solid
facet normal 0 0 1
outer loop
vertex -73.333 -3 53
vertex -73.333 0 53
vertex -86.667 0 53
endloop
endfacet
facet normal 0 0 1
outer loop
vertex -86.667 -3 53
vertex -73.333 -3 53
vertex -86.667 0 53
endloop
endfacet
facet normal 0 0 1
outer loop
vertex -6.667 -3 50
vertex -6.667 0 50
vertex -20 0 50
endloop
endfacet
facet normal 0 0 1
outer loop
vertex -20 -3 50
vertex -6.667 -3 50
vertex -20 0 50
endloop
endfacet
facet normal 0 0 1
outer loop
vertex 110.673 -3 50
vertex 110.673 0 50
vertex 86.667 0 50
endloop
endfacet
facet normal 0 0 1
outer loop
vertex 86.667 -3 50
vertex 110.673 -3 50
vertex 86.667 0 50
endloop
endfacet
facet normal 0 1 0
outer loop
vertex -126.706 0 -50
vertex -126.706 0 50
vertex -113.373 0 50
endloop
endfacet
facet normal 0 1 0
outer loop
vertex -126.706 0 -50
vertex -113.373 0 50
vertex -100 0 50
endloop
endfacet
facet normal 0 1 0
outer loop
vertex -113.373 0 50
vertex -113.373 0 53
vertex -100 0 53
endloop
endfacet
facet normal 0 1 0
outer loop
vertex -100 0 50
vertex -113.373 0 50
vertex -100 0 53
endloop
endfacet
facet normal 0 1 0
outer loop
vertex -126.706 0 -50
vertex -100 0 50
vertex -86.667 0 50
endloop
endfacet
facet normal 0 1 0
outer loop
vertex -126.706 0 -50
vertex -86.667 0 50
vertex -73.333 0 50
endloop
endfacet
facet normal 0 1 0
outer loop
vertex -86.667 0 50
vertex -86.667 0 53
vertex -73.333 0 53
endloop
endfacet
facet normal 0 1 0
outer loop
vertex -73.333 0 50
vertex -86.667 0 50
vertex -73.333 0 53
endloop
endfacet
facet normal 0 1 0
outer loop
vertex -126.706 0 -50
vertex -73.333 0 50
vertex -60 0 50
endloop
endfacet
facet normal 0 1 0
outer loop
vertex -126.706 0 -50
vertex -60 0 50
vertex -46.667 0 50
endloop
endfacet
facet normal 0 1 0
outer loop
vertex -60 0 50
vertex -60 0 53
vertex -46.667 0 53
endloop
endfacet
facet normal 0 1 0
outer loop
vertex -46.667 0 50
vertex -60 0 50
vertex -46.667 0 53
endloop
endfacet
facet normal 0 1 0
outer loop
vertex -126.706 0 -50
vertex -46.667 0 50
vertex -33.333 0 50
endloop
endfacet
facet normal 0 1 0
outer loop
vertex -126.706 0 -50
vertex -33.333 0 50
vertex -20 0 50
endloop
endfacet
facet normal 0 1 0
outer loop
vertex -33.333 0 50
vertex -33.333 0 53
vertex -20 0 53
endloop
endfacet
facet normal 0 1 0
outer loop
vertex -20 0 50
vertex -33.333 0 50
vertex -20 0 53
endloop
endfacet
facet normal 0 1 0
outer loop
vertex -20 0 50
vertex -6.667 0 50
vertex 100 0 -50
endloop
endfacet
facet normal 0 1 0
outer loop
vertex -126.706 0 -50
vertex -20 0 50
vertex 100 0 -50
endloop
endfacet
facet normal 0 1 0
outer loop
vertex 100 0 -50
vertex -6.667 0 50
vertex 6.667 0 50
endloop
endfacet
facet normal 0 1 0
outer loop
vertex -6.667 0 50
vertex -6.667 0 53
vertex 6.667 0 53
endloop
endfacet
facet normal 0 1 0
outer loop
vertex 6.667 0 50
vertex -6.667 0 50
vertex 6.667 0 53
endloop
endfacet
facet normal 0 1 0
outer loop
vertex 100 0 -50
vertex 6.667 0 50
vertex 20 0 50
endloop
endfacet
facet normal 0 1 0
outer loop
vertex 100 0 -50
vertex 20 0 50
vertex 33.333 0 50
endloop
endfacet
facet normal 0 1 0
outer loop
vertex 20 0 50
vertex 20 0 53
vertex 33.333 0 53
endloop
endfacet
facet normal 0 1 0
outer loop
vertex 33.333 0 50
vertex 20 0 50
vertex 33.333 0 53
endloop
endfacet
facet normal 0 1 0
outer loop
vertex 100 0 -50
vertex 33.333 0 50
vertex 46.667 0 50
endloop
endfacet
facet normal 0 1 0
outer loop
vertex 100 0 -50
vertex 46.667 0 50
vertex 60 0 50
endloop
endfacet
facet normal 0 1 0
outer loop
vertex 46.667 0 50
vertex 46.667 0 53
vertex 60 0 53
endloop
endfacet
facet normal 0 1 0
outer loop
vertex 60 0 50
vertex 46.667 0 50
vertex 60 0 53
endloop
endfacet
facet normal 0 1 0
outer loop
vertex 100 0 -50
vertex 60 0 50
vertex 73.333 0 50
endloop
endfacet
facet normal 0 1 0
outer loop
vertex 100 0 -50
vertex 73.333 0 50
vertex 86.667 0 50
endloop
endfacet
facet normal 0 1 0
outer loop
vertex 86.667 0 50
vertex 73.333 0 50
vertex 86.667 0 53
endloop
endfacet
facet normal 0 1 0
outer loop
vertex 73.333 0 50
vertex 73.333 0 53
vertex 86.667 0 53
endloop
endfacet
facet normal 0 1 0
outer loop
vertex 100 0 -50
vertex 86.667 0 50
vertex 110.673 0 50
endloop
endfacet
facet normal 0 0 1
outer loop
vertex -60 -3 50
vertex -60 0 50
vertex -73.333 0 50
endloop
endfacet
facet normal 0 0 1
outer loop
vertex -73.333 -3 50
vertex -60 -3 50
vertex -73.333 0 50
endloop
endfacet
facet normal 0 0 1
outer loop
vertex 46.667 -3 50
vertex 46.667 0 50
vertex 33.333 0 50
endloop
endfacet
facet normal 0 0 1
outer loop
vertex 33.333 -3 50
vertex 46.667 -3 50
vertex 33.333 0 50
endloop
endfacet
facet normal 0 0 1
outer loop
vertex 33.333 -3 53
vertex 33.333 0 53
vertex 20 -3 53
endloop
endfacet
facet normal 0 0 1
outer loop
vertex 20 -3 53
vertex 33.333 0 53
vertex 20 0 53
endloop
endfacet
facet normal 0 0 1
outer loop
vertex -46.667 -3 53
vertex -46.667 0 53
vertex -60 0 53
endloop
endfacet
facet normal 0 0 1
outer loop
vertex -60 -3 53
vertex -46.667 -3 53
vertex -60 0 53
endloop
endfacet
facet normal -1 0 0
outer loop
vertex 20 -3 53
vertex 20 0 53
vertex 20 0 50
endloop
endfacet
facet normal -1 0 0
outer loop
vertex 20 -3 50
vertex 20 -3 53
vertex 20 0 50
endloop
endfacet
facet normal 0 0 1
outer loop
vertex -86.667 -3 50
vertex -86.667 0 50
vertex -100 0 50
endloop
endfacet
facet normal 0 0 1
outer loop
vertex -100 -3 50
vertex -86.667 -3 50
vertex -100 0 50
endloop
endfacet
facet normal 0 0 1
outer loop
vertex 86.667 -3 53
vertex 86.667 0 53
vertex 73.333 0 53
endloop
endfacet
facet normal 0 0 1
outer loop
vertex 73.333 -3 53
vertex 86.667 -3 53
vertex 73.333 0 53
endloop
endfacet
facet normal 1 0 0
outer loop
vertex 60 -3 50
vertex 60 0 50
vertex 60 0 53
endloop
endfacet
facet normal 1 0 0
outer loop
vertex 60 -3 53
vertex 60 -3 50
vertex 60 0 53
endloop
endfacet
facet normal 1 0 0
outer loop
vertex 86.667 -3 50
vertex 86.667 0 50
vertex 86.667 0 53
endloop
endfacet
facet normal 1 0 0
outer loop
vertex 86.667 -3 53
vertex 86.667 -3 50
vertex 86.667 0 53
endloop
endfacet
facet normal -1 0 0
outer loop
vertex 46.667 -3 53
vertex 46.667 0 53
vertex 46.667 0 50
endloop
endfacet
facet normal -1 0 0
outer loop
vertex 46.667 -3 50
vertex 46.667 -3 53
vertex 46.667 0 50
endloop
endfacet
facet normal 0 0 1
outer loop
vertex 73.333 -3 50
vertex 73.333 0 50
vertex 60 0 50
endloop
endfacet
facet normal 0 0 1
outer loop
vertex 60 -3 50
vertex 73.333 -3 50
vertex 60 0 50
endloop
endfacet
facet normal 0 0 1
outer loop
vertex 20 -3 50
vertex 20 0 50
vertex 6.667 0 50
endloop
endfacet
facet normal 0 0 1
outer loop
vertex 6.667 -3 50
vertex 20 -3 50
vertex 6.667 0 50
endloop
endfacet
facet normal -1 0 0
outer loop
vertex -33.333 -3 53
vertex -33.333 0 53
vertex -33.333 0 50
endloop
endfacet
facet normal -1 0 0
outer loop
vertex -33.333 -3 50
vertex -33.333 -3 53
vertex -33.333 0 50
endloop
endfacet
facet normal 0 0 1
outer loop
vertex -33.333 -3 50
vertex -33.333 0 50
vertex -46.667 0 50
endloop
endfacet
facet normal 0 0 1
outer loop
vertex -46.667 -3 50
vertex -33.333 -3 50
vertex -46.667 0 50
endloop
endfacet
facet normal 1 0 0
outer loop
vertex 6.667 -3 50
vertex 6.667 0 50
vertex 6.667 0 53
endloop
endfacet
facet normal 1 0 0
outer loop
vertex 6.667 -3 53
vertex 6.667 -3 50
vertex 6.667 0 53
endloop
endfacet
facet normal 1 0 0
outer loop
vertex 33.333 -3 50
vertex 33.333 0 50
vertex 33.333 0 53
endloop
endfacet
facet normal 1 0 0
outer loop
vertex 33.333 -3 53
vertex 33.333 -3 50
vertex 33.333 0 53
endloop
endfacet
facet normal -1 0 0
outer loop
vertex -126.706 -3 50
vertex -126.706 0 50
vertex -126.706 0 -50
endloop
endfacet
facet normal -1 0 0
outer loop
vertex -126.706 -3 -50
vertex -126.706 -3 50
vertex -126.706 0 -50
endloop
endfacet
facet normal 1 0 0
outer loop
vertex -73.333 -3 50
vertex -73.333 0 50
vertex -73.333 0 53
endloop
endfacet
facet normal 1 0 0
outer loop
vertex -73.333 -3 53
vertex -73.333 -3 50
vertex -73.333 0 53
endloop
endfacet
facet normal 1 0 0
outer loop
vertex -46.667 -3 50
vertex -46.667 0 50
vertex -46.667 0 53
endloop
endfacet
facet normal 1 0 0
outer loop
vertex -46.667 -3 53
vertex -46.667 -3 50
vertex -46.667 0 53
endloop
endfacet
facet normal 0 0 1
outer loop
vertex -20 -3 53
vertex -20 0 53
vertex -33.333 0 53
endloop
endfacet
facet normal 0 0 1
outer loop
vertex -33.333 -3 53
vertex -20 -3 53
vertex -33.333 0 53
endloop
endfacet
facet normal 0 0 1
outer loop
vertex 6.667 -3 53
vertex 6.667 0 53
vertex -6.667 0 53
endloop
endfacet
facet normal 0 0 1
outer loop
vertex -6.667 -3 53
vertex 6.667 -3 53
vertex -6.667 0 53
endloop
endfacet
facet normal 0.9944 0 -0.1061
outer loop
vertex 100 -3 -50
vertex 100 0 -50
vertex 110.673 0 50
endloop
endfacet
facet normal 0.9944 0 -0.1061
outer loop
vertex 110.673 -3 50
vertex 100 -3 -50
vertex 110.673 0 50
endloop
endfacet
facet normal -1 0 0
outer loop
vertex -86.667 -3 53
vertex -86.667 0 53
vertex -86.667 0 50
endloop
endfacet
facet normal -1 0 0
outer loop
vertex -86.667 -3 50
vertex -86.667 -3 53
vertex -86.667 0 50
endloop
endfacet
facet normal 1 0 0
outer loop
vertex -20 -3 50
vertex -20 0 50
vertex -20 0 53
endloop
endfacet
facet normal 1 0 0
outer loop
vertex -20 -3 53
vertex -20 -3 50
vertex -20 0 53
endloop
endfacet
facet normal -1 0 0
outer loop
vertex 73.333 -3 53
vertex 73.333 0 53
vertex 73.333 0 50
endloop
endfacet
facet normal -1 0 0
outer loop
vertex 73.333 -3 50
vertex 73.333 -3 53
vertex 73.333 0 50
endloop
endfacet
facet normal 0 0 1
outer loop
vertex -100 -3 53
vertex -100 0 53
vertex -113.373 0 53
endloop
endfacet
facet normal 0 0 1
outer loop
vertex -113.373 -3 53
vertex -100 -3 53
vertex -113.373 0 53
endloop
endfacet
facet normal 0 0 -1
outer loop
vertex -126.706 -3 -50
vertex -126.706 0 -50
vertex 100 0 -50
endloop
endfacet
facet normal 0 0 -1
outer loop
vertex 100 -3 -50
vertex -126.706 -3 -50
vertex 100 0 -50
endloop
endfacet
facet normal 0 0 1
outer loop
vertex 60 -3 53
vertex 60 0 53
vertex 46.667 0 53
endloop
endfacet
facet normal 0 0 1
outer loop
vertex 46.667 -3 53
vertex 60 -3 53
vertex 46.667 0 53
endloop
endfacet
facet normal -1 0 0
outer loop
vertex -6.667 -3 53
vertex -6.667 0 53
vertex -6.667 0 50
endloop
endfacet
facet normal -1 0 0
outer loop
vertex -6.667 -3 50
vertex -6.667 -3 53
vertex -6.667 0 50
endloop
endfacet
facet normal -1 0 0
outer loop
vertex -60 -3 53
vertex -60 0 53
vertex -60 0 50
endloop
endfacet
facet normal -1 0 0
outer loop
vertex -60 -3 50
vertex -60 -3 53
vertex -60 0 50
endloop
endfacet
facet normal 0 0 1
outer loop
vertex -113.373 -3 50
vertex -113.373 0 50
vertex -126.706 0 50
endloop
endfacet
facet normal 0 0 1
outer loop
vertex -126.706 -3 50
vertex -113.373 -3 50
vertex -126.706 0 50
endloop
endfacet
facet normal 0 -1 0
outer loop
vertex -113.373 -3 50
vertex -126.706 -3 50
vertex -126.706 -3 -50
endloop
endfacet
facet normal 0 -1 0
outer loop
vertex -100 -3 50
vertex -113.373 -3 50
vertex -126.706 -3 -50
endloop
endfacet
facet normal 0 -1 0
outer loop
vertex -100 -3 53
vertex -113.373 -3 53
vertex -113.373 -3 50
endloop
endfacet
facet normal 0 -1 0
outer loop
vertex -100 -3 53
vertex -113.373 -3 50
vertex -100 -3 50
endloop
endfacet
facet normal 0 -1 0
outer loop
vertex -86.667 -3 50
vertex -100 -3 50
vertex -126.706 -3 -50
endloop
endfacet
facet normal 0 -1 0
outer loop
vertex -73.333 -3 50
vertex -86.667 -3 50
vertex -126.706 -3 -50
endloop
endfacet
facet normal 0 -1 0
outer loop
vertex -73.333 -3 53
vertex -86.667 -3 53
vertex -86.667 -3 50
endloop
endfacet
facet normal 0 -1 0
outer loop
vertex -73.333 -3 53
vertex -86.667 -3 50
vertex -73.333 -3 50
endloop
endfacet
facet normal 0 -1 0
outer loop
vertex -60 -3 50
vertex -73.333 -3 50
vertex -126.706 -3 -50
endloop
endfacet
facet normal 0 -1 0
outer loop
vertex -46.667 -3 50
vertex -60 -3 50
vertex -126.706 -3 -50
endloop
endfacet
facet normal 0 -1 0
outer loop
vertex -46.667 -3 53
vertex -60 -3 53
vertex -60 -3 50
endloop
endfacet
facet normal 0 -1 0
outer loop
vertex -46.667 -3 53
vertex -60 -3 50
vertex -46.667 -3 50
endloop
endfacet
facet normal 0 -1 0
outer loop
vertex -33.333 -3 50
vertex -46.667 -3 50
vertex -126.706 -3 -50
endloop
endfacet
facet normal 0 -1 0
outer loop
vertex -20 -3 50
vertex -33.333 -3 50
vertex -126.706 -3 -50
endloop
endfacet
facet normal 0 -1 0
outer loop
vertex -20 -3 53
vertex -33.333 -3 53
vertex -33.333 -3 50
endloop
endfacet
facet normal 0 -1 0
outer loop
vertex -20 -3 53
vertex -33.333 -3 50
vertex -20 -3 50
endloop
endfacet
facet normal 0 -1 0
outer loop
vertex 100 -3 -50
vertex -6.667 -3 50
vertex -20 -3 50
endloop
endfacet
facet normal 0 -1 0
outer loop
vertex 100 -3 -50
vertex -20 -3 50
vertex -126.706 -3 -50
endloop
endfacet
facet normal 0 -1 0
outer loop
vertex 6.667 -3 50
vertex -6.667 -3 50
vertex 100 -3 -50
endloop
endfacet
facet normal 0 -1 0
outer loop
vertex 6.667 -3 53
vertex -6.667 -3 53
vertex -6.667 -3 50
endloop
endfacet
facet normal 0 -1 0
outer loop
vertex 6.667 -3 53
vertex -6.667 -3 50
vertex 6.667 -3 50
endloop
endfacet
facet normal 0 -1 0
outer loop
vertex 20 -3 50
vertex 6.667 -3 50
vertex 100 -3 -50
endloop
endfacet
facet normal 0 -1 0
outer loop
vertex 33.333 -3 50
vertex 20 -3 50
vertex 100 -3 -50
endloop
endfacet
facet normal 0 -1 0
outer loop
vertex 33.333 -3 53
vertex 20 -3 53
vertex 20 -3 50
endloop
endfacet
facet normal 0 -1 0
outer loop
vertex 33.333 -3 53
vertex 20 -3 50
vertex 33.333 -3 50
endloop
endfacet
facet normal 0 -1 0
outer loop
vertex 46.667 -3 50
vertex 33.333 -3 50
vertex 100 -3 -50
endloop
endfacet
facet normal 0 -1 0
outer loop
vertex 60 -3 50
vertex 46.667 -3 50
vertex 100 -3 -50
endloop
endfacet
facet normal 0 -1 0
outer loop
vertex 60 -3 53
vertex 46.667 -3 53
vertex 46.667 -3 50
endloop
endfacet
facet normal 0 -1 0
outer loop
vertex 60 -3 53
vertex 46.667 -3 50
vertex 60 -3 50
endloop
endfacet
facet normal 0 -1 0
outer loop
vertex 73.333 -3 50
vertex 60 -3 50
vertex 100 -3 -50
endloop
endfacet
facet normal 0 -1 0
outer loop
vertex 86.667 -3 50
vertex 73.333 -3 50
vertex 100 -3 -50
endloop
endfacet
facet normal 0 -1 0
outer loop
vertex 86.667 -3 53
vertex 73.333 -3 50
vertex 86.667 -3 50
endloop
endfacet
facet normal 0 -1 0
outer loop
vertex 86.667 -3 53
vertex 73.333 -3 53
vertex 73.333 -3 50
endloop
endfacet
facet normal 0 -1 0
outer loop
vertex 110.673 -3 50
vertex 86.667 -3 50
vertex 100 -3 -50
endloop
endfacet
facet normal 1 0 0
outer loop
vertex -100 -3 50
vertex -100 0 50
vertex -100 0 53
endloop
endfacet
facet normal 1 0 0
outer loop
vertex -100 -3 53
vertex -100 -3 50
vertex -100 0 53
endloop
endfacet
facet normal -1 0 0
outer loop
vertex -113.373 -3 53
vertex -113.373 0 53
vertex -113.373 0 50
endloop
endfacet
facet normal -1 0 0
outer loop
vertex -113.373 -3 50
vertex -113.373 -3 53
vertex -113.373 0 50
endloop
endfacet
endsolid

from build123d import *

# Parameters (mm, degrees)
F1_DEPTH = 3


# Not quite as in the source:
# - ends of sketch curves that miss each other by under 0.0002 mm in the source are joined


with BuildPart() as f1:
    # F0 (on Front) → F1 (new body)
    with BuildSketch(Plane.XZ):
        Polygon((-86.6666681571, 50), (-100.0000014901, 50), (-100.0000014901, 53.0000007451), (-113.3729092283, 53.0000007451), (-113.3729092283, 50.0000007451), (-126.7062425613, 50.0000007451), (-126.7062425613, -50), (100, -50), (110.67250236, 50), (86.6666611759, 50), (86.6666611759, 53), (73.3333278429, 53), (73.3333278429, 50), (59.9999951759, 50), (59.9999951759, 53), (46.6666618429, 53), (46.6666618429, 50), (33.3333291759, 50), (33.3333291759, 53), (19.9999958429, 53), (19.9999958429, 50), (6.6666631759, 50), (6.6666631759, 53), (-6.6666701571, 53), (-6.6666701571, 50), (-20.0000028241, 50), (-20.0000028241, 53), (-33.3333361571, 53), (-33.3333361571, 50), (-46.6666688241, 50), (-46.6666688241, 53), (-60.0000021571, 53), (-60.0000021571, 50), (-73.3333348241, 50), (-73.3333348241, 53), (-86.6666681571, 53), align=None)
    extrude(amount=F1_DEPTH)


solid = f1.part
